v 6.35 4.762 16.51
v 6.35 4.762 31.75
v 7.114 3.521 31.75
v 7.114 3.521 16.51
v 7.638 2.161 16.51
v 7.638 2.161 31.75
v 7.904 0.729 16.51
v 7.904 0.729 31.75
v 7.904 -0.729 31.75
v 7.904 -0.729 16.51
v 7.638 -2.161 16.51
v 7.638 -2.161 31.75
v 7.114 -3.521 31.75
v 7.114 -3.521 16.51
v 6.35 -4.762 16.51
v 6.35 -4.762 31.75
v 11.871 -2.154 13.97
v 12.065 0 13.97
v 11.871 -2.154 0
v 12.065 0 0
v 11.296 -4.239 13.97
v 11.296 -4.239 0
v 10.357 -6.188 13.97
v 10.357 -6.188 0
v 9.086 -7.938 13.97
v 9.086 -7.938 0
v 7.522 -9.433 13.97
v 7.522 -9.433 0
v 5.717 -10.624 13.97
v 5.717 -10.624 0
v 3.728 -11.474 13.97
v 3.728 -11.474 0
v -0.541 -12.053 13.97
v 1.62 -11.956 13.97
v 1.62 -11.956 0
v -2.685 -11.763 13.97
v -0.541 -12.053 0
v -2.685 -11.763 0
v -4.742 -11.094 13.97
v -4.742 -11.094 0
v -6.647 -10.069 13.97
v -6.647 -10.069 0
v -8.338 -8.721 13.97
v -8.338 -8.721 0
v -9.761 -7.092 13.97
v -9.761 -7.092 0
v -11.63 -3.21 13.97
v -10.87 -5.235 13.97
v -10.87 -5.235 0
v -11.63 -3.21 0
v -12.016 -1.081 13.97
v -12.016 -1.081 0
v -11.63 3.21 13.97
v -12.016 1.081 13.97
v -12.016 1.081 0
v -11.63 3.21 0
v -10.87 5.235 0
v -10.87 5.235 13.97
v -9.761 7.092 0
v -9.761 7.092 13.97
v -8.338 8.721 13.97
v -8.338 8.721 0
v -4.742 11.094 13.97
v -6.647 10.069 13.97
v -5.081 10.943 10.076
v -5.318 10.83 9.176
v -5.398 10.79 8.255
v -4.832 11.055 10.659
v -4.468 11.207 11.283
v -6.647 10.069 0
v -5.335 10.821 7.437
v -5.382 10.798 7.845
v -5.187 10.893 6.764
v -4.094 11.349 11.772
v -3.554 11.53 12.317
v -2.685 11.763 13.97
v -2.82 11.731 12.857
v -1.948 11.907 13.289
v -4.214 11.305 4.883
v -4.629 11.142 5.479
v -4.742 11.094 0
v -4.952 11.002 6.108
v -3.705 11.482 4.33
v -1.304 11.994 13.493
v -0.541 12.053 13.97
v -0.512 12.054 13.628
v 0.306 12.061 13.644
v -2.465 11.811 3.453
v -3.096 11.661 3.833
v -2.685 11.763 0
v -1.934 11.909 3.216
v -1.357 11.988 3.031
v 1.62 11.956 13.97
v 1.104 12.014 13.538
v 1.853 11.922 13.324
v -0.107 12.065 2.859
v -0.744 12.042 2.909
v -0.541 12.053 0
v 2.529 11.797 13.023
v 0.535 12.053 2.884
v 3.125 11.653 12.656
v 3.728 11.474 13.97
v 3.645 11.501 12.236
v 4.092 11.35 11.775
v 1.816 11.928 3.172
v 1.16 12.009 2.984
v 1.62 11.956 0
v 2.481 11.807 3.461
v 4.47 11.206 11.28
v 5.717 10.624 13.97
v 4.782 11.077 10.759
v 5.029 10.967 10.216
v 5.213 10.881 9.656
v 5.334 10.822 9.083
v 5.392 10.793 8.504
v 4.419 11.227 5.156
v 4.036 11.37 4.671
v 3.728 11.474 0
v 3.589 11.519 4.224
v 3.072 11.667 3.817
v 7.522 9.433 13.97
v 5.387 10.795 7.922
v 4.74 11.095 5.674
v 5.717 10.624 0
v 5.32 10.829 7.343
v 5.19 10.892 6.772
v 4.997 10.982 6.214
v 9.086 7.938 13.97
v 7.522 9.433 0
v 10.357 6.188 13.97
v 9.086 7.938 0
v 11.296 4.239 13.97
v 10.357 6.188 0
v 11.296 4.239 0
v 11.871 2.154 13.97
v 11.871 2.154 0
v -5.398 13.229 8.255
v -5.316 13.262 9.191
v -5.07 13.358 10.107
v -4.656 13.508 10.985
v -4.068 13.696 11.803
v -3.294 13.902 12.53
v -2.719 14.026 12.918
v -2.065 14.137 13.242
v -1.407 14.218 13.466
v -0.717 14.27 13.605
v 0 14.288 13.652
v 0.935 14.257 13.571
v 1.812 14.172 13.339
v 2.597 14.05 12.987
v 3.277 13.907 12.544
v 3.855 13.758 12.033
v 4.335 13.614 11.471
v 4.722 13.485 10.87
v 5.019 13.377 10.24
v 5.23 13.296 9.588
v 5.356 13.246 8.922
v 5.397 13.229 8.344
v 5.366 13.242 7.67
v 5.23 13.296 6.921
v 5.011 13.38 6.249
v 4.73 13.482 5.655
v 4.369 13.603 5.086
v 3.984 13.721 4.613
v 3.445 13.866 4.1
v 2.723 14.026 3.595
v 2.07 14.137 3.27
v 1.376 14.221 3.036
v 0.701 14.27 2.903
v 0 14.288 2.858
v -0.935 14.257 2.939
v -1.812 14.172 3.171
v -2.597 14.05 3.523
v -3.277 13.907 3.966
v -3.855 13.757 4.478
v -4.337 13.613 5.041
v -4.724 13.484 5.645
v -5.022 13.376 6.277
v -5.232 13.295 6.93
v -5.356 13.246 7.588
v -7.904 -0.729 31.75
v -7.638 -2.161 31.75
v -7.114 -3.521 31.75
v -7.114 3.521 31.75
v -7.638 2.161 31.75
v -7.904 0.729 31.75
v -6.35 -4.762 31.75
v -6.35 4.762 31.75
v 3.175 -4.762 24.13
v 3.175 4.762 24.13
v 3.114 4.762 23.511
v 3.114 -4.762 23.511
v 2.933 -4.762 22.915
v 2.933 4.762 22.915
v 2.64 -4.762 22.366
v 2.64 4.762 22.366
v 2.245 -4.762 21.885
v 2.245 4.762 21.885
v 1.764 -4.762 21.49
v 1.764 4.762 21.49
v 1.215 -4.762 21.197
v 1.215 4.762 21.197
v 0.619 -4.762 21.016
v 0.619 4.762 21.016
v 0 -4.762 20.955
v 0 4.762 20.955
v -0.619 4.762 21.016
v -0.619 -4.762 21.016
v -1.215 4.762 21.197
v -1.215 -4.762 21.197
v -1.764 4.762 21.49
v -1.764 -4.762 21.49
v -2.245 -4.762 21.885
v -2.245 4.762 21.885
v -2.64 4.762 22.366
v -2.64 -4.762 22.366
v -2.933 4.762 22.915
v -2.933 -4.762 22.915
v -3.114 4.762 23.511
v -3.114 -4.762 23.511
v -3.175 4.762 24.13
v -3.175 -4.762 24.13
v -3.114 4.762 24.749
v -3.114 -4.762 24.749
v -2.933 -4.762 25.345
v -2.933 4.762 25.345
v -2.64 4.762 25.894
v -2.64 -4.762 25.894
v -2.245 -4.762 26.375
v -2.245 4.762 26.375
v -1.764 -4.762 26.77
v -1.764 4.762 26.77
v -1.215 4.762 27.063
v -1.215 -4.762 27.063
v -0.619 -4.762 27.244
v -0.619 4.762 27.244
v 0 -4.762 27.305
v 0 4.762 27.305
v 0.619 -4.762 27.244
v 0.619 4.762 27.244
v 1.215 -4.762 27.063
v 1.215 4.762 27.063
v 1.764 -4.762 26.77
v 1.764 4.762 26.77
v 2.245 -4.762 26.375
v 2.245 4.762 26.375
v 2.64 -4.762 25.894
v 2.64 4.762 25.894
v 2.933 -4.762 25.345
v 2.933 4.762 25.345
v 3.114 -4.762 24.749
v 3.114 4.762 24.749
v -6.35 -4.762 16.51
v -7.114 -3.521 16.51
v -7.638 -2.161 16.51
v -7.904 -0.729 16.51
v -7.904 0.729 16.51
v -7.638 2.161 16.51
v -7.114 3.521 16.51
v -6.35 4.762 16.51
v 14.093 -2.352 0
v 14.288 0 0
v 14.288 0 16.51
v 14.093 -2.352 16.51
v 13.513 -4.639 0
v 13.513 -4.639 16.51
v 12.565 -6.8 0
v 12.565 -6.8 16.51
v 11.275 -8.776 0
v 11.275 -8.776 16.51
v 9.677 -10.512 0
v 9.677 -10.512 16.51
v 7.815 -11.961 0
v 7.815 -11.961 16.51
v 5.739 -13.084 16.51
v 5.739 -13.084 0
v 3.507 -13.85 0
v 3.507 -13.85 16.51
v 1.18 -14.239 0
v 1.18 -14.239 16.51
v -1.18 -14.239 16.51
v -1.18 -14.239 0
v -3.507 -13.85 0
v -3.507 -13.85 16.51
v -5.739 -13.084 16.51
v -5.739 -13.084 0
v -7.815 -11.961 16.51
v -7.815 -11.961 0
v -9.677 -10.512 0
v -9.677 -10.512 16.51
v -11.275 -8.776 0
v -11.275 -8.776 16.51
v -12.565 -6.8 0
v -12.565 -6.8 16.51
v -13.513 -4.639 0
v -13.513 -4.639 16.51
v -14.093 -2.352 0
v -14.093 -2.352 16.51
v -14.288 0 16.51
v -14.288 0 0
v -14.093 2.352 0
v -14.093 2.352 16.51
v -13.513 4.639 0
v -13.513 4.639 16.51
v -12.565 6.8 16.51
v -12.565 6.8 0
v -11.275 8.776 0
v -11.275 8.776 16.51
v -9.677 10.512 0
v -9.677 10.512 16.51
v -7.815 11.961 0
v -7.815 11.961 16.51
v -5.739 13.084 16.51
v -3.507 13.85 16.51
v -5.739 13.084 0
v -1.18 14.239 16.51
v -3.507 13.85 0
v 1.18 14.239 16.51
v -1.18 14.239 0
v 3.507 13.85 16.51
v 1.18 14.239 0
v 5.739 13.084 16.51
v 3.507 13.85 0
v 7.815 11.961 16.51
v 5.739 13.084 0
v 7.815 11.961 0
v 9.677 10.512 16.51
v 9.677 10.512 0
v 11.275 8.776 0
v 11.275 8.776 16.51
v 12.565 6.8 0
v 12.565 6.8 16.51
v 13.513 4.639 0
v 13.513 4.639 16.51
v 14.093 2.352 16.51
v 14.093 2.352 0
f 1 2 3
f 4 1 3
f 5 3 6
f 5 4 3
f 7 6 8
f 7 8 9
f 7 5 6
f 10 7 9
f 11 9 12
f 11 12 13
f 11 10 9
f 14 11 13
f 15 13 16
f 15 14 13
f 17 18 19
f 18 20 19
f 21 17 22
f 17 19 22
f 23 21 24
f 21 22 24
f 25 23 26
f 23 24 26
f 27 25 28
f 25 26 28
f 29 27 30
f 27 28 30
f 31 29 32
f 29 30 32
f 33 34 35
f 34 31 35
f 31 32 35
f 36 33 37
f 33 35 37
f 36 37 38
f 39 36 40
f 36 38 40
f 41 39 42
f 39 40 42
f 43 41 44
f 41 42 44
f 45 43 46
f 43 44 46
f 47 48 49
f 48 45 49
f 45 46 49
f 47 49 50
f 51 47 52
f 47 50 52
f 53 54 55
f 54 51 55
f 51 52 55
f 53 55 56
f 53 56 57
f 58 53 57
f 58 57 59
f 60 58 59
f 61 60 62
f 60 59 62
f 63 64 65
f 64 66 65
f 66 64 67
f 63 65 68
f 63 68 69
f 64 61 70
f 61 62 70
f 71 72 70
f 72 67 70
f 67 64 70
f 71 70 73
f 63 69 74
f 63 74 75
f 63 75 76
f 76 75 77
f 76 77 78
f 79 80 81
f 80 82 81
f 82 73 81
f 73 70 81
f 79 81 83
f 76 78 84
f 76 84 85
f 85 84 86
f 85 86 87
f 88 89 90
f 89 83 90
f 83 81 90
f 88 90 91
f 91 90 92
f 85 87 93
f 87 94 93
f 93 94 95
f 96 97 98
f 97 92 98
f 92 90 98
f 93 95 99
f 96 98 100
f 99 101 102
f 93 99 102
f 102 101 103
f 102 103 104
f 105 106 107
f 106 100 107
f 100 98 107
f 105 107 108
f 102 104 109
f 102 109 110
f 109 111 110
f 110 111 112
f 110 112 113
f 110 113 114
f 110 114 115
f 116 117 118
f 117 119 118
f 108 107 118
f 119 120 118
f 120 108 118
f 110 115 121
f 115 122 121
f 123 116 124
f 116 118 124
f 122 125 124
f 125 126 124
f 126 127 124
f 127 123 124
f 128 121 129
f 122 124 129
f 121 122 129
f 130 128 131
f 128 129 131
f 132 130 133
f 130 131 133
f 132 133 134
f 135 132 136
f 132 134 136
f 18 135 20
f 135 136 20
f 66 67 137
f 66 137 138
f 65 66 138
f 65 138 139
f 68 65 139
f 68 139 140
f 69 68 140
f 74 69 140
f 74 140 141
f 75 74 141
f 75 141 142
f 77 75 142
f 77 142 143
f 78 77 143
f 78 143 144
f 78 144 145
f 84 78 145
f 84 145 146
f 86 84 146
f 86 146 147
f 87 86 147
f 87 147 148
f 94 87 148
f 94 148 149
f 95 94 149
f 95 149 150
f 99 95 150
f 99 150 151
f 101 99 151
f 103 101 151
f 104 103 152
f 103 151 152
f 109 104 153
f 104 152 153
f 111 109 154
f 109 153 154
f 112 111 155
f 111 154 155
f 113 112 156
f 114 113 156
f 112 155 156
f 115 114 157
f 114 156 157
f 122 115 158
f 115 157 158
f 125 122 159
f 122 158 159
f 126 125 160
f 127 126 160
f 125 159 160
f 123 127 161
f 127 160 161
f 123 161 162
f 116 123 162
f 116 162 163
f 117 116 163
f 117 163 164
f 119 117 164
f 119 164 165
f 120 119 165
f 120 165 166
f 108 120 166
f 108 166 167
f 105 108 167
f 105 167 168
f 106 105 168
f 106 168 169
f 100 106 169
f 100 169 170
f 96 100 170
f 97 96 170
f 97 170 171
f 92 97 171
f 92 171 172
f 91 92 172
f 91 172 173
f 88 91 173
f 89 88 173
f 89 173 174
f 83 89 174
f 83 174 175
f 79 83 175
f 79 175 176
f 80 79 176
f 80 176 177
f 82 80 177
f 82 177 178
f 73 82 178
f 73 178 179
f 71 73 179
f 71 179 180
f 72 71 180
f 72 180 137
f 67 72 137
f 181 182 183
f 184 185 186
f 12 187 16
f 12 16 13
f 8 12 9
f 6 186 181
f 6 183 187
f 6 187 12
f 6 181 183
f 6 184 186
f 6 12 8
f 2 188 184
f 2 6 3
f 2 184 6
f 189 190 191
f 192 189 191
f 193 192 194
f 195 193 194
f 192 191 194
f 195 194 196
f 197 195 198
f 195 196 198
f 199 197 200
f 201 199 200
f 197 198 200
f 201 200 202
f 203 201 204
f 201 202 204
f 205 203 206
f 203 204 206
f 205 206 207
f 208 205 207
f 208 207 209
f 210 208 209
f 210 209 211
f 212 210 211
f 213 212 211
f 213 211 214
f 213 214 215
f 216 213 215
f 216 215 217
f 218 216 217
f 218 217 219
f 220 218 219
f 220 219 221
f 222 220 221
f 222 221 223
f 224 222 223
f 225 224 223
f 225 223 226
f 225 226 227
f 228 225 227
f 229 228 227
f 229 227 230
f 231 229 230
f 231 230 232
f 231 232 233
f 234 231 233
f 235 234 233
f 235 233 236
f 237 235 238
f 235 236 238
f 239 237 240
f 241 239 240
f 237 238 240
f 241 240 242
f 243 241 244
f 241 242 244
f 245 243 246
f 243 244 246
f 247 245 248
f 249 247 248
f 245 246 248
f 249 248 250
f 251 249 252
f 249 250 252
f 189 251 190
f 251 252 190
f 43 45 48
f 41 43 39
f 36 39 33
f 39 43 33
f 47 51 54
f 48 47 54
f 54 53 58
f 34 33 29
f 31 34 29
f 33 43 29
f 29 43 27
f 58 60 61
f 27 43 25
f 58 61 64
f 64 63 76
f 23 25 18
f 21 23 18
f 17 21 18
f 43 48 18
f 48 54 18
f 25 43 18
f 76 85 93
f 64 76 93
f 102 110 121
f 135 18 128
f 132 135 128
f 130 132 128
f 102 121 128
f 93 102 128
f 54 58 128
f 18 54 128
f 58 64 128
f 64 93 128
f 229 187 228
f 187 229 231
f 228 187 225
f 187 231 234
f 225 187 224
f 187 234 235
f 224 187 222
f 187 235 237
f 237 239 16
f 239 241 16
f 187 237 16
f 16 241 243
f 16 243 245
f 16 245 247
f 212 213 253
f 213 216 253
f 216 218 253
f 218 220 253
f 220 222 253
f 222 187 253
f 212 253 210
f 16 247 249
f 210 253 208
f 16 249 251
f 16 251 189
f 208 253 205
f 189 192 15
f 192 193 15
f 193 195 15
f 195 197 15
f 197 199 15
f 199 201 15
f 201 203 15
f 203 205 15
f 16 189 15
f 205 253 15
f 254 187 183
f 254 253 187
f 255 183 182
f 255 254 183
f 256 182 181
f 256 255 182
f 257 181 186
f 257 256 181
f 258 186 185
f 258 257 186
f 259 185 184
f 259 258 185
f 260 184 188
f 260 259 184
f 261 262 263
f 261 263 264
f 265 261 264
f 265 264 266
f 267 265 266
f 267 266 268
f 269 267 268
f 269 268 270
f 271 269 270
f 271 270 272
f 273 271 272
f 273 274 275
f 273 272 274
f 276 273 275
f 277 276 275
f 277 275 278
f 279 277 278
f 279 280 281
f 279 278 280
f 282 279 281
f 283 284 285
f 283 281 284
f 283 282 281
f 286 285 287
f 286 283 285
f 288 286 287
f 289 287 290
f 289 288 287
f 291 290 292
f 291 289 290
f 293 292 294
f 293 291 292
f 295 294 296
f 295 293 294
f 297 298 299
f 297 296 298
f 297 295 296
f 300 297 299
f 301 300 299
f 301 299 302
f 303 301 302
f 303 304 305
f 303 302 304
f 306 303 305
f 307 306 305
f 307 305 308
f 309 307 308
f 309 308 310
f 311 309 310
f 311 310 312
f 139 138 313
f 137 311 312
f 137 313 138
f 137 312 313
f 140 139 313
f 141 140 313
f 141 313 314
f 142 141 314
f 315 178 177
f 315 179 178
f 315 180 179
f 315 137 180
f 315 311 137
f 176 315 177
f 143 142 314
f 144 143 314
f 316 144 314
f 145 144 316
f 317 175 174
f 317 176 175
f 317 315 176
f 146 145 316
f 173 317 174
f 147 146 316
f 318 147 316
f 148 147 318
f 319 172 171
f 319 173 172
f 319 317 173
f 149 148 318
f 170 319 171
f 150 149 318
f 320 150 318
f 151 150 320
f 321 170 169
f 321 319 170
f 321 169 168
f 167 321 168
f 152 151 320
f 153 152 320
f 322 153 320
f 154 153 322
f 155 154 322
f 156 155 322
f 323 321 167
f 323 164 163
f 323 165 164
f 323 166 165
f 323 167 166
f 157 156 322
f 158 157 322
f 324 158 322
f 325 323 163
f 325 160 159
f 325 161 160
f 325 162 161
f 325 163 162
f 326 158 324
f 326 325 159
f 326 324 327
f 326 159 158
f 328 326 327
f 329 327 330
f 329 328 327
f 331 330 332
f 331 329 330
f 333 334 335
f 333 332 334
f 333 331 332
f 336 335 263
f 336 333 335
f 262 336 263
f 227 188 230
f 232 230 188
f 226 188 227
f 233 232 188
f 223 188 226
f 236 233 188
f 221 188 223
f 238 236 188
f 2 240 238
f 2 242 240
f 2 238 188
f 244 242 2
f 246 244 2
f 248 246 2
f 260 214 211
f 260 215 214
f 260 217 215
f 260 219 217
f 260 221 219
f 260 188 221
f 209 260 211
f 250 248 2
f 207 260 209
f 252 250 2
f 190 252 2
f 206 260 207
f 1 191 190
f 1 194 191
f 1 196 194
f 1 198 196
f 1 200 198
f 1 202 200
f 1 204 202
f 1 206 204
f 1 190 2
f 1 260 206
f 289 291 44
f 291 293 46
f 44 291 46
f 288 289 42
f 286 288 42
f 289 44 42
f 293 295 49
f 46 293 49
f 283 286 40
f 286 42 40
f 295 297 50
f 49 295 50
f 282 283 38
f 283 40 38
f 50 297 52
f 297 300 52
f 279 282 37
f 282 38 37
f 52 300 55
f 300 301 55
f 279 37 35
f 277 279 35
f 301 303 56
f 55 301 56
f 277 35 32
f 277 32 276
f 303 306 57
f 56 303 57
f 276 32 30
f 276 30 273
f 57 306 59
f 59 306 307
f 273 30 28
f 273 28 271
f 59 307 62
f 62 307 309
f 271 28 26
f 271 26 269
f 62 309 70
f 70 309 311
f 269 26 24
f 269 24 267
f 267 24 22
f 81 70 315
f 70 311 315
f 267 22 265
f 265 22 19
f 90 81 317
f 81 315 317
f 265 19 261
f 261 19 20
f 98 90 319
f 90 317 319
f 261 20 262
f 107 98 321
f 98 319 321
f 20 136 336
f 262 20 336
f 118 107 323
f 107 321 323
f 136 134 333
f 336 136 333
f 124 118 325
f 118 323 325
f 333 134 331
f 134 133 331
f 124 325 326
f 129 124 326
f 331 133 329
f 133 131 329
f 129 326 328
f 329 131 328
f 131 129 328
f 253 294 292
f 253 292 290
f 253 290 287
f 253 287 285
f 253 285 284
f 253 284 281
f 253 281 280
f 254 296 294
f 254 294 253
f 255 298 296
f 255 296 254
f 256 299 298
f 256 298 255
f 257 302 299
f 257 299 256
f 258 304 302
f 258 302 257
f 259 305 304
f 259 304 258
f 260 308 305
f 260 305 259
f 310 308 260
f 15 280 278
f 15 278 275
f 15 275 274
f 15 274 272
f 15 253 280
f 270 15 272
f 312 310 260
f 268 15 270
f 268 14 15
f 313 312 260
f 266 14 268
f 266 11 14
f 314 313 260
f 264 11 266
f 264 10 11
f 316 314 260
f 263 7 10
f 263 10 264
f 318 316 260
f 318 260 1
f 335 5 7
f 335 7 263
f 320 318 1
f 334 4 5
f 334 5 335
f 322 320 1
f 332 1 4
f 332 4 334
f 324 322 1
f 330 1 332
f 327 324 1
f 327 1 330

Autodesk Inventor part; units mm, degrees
ref_plane "YZ Plane" through (0, 0, 0) normal (1, 0, 0) x (0, 1, 0)
ref_plane "XY Plane" through (0, 0, 0) normal (0, 0, 1) x (1, 0, 0)
sketch "Sketch1" plane through (0, 0, 0) normal (0, 0, 1) x (1, 0, 0)
  circle A0 centre (0, 0) radius 14.2875
  circle A1 centre (0, 0) radius 12.065
  dimension "d0" = 28.575
  dimension "d1" = 24.13
extrude "Extrusion1" add sketch "Sketch1" along normal blind 13.97
sketch "Sketch2" plane through (0, 0, 13.97) normal (0, 0, 1) x (1, 0, 0)
  circle A0 centre (0, 0) radius 14.2875 projected
extrude "Extrusion2" add sketch "Sketch2" along normal blind 2.54
sketch "Sketch3" plane through (0, 0, 16.51) normal (0, 0, 1) x (1, 0, 0)
  circle A0 centre (0, 0) radius 14.2875 projected
  circle A1 centre (0, 0) radius 7.9375
  line L0 (-6.35, -4.7625) -> (6.35, -4.7625)
  line L1 (-6.35, 4.7625) -> (6.35, 4.7625)
  dimension "d6" = 15.875
  dimension "d7" = 9.525
  dimension "d8" = 0
  dimension "d9" = 0
extrude "Extrusion3" add sketch "Sketch3" along normal blind 15.24 contours A1 L0 L1
thread "Thread1" size "5/8-11 UNC" class "2A" standard "ANSI Unified Screw Threads" full length
thread "Thread2" size "5/8-11 UNC" class "2A" standard "ANSI Unified Screw Threads" full length
sketch "Sketch4" plane through (-6.35, 4.7625, 16.51) normal (0, 1, 0) x (1, 0, 0)
  circle A0 centre (6.35, -7.62) radius 3.175
  point P0 (6.35, 16.51)
  dimension "d16" = 6.35
extrude "Extrusion4" cut sketch "Sketch4" against normal blind 15.24
ref_plane "Work Plane1" through (0, 14.2875, 0) normal (0, 1, 0) x (-1, 0, 0)
sketch "Sketch5" plane through (0, 14.2875, 0) normal (0, 1, 0) x (-1, 0, 0)
  line L0 (-14.2875, 16.51) -> (14.2875, 16.51) projected
  line L1 (-14.2875, 0) -> (14.2875, 0) projected
  circle A0 centre (0, 8.255) radius 5.3975
  point P0 (0, 0)
  dimension "d20" = 10.795
  dimension "d23" = 8.255
  dimension "d24" = 8.255
extrude "Extrusion5" cut sketch "Sketch5" against normal blind 15.24
properties part number "1in Actuator Bottom Cap 1764"
